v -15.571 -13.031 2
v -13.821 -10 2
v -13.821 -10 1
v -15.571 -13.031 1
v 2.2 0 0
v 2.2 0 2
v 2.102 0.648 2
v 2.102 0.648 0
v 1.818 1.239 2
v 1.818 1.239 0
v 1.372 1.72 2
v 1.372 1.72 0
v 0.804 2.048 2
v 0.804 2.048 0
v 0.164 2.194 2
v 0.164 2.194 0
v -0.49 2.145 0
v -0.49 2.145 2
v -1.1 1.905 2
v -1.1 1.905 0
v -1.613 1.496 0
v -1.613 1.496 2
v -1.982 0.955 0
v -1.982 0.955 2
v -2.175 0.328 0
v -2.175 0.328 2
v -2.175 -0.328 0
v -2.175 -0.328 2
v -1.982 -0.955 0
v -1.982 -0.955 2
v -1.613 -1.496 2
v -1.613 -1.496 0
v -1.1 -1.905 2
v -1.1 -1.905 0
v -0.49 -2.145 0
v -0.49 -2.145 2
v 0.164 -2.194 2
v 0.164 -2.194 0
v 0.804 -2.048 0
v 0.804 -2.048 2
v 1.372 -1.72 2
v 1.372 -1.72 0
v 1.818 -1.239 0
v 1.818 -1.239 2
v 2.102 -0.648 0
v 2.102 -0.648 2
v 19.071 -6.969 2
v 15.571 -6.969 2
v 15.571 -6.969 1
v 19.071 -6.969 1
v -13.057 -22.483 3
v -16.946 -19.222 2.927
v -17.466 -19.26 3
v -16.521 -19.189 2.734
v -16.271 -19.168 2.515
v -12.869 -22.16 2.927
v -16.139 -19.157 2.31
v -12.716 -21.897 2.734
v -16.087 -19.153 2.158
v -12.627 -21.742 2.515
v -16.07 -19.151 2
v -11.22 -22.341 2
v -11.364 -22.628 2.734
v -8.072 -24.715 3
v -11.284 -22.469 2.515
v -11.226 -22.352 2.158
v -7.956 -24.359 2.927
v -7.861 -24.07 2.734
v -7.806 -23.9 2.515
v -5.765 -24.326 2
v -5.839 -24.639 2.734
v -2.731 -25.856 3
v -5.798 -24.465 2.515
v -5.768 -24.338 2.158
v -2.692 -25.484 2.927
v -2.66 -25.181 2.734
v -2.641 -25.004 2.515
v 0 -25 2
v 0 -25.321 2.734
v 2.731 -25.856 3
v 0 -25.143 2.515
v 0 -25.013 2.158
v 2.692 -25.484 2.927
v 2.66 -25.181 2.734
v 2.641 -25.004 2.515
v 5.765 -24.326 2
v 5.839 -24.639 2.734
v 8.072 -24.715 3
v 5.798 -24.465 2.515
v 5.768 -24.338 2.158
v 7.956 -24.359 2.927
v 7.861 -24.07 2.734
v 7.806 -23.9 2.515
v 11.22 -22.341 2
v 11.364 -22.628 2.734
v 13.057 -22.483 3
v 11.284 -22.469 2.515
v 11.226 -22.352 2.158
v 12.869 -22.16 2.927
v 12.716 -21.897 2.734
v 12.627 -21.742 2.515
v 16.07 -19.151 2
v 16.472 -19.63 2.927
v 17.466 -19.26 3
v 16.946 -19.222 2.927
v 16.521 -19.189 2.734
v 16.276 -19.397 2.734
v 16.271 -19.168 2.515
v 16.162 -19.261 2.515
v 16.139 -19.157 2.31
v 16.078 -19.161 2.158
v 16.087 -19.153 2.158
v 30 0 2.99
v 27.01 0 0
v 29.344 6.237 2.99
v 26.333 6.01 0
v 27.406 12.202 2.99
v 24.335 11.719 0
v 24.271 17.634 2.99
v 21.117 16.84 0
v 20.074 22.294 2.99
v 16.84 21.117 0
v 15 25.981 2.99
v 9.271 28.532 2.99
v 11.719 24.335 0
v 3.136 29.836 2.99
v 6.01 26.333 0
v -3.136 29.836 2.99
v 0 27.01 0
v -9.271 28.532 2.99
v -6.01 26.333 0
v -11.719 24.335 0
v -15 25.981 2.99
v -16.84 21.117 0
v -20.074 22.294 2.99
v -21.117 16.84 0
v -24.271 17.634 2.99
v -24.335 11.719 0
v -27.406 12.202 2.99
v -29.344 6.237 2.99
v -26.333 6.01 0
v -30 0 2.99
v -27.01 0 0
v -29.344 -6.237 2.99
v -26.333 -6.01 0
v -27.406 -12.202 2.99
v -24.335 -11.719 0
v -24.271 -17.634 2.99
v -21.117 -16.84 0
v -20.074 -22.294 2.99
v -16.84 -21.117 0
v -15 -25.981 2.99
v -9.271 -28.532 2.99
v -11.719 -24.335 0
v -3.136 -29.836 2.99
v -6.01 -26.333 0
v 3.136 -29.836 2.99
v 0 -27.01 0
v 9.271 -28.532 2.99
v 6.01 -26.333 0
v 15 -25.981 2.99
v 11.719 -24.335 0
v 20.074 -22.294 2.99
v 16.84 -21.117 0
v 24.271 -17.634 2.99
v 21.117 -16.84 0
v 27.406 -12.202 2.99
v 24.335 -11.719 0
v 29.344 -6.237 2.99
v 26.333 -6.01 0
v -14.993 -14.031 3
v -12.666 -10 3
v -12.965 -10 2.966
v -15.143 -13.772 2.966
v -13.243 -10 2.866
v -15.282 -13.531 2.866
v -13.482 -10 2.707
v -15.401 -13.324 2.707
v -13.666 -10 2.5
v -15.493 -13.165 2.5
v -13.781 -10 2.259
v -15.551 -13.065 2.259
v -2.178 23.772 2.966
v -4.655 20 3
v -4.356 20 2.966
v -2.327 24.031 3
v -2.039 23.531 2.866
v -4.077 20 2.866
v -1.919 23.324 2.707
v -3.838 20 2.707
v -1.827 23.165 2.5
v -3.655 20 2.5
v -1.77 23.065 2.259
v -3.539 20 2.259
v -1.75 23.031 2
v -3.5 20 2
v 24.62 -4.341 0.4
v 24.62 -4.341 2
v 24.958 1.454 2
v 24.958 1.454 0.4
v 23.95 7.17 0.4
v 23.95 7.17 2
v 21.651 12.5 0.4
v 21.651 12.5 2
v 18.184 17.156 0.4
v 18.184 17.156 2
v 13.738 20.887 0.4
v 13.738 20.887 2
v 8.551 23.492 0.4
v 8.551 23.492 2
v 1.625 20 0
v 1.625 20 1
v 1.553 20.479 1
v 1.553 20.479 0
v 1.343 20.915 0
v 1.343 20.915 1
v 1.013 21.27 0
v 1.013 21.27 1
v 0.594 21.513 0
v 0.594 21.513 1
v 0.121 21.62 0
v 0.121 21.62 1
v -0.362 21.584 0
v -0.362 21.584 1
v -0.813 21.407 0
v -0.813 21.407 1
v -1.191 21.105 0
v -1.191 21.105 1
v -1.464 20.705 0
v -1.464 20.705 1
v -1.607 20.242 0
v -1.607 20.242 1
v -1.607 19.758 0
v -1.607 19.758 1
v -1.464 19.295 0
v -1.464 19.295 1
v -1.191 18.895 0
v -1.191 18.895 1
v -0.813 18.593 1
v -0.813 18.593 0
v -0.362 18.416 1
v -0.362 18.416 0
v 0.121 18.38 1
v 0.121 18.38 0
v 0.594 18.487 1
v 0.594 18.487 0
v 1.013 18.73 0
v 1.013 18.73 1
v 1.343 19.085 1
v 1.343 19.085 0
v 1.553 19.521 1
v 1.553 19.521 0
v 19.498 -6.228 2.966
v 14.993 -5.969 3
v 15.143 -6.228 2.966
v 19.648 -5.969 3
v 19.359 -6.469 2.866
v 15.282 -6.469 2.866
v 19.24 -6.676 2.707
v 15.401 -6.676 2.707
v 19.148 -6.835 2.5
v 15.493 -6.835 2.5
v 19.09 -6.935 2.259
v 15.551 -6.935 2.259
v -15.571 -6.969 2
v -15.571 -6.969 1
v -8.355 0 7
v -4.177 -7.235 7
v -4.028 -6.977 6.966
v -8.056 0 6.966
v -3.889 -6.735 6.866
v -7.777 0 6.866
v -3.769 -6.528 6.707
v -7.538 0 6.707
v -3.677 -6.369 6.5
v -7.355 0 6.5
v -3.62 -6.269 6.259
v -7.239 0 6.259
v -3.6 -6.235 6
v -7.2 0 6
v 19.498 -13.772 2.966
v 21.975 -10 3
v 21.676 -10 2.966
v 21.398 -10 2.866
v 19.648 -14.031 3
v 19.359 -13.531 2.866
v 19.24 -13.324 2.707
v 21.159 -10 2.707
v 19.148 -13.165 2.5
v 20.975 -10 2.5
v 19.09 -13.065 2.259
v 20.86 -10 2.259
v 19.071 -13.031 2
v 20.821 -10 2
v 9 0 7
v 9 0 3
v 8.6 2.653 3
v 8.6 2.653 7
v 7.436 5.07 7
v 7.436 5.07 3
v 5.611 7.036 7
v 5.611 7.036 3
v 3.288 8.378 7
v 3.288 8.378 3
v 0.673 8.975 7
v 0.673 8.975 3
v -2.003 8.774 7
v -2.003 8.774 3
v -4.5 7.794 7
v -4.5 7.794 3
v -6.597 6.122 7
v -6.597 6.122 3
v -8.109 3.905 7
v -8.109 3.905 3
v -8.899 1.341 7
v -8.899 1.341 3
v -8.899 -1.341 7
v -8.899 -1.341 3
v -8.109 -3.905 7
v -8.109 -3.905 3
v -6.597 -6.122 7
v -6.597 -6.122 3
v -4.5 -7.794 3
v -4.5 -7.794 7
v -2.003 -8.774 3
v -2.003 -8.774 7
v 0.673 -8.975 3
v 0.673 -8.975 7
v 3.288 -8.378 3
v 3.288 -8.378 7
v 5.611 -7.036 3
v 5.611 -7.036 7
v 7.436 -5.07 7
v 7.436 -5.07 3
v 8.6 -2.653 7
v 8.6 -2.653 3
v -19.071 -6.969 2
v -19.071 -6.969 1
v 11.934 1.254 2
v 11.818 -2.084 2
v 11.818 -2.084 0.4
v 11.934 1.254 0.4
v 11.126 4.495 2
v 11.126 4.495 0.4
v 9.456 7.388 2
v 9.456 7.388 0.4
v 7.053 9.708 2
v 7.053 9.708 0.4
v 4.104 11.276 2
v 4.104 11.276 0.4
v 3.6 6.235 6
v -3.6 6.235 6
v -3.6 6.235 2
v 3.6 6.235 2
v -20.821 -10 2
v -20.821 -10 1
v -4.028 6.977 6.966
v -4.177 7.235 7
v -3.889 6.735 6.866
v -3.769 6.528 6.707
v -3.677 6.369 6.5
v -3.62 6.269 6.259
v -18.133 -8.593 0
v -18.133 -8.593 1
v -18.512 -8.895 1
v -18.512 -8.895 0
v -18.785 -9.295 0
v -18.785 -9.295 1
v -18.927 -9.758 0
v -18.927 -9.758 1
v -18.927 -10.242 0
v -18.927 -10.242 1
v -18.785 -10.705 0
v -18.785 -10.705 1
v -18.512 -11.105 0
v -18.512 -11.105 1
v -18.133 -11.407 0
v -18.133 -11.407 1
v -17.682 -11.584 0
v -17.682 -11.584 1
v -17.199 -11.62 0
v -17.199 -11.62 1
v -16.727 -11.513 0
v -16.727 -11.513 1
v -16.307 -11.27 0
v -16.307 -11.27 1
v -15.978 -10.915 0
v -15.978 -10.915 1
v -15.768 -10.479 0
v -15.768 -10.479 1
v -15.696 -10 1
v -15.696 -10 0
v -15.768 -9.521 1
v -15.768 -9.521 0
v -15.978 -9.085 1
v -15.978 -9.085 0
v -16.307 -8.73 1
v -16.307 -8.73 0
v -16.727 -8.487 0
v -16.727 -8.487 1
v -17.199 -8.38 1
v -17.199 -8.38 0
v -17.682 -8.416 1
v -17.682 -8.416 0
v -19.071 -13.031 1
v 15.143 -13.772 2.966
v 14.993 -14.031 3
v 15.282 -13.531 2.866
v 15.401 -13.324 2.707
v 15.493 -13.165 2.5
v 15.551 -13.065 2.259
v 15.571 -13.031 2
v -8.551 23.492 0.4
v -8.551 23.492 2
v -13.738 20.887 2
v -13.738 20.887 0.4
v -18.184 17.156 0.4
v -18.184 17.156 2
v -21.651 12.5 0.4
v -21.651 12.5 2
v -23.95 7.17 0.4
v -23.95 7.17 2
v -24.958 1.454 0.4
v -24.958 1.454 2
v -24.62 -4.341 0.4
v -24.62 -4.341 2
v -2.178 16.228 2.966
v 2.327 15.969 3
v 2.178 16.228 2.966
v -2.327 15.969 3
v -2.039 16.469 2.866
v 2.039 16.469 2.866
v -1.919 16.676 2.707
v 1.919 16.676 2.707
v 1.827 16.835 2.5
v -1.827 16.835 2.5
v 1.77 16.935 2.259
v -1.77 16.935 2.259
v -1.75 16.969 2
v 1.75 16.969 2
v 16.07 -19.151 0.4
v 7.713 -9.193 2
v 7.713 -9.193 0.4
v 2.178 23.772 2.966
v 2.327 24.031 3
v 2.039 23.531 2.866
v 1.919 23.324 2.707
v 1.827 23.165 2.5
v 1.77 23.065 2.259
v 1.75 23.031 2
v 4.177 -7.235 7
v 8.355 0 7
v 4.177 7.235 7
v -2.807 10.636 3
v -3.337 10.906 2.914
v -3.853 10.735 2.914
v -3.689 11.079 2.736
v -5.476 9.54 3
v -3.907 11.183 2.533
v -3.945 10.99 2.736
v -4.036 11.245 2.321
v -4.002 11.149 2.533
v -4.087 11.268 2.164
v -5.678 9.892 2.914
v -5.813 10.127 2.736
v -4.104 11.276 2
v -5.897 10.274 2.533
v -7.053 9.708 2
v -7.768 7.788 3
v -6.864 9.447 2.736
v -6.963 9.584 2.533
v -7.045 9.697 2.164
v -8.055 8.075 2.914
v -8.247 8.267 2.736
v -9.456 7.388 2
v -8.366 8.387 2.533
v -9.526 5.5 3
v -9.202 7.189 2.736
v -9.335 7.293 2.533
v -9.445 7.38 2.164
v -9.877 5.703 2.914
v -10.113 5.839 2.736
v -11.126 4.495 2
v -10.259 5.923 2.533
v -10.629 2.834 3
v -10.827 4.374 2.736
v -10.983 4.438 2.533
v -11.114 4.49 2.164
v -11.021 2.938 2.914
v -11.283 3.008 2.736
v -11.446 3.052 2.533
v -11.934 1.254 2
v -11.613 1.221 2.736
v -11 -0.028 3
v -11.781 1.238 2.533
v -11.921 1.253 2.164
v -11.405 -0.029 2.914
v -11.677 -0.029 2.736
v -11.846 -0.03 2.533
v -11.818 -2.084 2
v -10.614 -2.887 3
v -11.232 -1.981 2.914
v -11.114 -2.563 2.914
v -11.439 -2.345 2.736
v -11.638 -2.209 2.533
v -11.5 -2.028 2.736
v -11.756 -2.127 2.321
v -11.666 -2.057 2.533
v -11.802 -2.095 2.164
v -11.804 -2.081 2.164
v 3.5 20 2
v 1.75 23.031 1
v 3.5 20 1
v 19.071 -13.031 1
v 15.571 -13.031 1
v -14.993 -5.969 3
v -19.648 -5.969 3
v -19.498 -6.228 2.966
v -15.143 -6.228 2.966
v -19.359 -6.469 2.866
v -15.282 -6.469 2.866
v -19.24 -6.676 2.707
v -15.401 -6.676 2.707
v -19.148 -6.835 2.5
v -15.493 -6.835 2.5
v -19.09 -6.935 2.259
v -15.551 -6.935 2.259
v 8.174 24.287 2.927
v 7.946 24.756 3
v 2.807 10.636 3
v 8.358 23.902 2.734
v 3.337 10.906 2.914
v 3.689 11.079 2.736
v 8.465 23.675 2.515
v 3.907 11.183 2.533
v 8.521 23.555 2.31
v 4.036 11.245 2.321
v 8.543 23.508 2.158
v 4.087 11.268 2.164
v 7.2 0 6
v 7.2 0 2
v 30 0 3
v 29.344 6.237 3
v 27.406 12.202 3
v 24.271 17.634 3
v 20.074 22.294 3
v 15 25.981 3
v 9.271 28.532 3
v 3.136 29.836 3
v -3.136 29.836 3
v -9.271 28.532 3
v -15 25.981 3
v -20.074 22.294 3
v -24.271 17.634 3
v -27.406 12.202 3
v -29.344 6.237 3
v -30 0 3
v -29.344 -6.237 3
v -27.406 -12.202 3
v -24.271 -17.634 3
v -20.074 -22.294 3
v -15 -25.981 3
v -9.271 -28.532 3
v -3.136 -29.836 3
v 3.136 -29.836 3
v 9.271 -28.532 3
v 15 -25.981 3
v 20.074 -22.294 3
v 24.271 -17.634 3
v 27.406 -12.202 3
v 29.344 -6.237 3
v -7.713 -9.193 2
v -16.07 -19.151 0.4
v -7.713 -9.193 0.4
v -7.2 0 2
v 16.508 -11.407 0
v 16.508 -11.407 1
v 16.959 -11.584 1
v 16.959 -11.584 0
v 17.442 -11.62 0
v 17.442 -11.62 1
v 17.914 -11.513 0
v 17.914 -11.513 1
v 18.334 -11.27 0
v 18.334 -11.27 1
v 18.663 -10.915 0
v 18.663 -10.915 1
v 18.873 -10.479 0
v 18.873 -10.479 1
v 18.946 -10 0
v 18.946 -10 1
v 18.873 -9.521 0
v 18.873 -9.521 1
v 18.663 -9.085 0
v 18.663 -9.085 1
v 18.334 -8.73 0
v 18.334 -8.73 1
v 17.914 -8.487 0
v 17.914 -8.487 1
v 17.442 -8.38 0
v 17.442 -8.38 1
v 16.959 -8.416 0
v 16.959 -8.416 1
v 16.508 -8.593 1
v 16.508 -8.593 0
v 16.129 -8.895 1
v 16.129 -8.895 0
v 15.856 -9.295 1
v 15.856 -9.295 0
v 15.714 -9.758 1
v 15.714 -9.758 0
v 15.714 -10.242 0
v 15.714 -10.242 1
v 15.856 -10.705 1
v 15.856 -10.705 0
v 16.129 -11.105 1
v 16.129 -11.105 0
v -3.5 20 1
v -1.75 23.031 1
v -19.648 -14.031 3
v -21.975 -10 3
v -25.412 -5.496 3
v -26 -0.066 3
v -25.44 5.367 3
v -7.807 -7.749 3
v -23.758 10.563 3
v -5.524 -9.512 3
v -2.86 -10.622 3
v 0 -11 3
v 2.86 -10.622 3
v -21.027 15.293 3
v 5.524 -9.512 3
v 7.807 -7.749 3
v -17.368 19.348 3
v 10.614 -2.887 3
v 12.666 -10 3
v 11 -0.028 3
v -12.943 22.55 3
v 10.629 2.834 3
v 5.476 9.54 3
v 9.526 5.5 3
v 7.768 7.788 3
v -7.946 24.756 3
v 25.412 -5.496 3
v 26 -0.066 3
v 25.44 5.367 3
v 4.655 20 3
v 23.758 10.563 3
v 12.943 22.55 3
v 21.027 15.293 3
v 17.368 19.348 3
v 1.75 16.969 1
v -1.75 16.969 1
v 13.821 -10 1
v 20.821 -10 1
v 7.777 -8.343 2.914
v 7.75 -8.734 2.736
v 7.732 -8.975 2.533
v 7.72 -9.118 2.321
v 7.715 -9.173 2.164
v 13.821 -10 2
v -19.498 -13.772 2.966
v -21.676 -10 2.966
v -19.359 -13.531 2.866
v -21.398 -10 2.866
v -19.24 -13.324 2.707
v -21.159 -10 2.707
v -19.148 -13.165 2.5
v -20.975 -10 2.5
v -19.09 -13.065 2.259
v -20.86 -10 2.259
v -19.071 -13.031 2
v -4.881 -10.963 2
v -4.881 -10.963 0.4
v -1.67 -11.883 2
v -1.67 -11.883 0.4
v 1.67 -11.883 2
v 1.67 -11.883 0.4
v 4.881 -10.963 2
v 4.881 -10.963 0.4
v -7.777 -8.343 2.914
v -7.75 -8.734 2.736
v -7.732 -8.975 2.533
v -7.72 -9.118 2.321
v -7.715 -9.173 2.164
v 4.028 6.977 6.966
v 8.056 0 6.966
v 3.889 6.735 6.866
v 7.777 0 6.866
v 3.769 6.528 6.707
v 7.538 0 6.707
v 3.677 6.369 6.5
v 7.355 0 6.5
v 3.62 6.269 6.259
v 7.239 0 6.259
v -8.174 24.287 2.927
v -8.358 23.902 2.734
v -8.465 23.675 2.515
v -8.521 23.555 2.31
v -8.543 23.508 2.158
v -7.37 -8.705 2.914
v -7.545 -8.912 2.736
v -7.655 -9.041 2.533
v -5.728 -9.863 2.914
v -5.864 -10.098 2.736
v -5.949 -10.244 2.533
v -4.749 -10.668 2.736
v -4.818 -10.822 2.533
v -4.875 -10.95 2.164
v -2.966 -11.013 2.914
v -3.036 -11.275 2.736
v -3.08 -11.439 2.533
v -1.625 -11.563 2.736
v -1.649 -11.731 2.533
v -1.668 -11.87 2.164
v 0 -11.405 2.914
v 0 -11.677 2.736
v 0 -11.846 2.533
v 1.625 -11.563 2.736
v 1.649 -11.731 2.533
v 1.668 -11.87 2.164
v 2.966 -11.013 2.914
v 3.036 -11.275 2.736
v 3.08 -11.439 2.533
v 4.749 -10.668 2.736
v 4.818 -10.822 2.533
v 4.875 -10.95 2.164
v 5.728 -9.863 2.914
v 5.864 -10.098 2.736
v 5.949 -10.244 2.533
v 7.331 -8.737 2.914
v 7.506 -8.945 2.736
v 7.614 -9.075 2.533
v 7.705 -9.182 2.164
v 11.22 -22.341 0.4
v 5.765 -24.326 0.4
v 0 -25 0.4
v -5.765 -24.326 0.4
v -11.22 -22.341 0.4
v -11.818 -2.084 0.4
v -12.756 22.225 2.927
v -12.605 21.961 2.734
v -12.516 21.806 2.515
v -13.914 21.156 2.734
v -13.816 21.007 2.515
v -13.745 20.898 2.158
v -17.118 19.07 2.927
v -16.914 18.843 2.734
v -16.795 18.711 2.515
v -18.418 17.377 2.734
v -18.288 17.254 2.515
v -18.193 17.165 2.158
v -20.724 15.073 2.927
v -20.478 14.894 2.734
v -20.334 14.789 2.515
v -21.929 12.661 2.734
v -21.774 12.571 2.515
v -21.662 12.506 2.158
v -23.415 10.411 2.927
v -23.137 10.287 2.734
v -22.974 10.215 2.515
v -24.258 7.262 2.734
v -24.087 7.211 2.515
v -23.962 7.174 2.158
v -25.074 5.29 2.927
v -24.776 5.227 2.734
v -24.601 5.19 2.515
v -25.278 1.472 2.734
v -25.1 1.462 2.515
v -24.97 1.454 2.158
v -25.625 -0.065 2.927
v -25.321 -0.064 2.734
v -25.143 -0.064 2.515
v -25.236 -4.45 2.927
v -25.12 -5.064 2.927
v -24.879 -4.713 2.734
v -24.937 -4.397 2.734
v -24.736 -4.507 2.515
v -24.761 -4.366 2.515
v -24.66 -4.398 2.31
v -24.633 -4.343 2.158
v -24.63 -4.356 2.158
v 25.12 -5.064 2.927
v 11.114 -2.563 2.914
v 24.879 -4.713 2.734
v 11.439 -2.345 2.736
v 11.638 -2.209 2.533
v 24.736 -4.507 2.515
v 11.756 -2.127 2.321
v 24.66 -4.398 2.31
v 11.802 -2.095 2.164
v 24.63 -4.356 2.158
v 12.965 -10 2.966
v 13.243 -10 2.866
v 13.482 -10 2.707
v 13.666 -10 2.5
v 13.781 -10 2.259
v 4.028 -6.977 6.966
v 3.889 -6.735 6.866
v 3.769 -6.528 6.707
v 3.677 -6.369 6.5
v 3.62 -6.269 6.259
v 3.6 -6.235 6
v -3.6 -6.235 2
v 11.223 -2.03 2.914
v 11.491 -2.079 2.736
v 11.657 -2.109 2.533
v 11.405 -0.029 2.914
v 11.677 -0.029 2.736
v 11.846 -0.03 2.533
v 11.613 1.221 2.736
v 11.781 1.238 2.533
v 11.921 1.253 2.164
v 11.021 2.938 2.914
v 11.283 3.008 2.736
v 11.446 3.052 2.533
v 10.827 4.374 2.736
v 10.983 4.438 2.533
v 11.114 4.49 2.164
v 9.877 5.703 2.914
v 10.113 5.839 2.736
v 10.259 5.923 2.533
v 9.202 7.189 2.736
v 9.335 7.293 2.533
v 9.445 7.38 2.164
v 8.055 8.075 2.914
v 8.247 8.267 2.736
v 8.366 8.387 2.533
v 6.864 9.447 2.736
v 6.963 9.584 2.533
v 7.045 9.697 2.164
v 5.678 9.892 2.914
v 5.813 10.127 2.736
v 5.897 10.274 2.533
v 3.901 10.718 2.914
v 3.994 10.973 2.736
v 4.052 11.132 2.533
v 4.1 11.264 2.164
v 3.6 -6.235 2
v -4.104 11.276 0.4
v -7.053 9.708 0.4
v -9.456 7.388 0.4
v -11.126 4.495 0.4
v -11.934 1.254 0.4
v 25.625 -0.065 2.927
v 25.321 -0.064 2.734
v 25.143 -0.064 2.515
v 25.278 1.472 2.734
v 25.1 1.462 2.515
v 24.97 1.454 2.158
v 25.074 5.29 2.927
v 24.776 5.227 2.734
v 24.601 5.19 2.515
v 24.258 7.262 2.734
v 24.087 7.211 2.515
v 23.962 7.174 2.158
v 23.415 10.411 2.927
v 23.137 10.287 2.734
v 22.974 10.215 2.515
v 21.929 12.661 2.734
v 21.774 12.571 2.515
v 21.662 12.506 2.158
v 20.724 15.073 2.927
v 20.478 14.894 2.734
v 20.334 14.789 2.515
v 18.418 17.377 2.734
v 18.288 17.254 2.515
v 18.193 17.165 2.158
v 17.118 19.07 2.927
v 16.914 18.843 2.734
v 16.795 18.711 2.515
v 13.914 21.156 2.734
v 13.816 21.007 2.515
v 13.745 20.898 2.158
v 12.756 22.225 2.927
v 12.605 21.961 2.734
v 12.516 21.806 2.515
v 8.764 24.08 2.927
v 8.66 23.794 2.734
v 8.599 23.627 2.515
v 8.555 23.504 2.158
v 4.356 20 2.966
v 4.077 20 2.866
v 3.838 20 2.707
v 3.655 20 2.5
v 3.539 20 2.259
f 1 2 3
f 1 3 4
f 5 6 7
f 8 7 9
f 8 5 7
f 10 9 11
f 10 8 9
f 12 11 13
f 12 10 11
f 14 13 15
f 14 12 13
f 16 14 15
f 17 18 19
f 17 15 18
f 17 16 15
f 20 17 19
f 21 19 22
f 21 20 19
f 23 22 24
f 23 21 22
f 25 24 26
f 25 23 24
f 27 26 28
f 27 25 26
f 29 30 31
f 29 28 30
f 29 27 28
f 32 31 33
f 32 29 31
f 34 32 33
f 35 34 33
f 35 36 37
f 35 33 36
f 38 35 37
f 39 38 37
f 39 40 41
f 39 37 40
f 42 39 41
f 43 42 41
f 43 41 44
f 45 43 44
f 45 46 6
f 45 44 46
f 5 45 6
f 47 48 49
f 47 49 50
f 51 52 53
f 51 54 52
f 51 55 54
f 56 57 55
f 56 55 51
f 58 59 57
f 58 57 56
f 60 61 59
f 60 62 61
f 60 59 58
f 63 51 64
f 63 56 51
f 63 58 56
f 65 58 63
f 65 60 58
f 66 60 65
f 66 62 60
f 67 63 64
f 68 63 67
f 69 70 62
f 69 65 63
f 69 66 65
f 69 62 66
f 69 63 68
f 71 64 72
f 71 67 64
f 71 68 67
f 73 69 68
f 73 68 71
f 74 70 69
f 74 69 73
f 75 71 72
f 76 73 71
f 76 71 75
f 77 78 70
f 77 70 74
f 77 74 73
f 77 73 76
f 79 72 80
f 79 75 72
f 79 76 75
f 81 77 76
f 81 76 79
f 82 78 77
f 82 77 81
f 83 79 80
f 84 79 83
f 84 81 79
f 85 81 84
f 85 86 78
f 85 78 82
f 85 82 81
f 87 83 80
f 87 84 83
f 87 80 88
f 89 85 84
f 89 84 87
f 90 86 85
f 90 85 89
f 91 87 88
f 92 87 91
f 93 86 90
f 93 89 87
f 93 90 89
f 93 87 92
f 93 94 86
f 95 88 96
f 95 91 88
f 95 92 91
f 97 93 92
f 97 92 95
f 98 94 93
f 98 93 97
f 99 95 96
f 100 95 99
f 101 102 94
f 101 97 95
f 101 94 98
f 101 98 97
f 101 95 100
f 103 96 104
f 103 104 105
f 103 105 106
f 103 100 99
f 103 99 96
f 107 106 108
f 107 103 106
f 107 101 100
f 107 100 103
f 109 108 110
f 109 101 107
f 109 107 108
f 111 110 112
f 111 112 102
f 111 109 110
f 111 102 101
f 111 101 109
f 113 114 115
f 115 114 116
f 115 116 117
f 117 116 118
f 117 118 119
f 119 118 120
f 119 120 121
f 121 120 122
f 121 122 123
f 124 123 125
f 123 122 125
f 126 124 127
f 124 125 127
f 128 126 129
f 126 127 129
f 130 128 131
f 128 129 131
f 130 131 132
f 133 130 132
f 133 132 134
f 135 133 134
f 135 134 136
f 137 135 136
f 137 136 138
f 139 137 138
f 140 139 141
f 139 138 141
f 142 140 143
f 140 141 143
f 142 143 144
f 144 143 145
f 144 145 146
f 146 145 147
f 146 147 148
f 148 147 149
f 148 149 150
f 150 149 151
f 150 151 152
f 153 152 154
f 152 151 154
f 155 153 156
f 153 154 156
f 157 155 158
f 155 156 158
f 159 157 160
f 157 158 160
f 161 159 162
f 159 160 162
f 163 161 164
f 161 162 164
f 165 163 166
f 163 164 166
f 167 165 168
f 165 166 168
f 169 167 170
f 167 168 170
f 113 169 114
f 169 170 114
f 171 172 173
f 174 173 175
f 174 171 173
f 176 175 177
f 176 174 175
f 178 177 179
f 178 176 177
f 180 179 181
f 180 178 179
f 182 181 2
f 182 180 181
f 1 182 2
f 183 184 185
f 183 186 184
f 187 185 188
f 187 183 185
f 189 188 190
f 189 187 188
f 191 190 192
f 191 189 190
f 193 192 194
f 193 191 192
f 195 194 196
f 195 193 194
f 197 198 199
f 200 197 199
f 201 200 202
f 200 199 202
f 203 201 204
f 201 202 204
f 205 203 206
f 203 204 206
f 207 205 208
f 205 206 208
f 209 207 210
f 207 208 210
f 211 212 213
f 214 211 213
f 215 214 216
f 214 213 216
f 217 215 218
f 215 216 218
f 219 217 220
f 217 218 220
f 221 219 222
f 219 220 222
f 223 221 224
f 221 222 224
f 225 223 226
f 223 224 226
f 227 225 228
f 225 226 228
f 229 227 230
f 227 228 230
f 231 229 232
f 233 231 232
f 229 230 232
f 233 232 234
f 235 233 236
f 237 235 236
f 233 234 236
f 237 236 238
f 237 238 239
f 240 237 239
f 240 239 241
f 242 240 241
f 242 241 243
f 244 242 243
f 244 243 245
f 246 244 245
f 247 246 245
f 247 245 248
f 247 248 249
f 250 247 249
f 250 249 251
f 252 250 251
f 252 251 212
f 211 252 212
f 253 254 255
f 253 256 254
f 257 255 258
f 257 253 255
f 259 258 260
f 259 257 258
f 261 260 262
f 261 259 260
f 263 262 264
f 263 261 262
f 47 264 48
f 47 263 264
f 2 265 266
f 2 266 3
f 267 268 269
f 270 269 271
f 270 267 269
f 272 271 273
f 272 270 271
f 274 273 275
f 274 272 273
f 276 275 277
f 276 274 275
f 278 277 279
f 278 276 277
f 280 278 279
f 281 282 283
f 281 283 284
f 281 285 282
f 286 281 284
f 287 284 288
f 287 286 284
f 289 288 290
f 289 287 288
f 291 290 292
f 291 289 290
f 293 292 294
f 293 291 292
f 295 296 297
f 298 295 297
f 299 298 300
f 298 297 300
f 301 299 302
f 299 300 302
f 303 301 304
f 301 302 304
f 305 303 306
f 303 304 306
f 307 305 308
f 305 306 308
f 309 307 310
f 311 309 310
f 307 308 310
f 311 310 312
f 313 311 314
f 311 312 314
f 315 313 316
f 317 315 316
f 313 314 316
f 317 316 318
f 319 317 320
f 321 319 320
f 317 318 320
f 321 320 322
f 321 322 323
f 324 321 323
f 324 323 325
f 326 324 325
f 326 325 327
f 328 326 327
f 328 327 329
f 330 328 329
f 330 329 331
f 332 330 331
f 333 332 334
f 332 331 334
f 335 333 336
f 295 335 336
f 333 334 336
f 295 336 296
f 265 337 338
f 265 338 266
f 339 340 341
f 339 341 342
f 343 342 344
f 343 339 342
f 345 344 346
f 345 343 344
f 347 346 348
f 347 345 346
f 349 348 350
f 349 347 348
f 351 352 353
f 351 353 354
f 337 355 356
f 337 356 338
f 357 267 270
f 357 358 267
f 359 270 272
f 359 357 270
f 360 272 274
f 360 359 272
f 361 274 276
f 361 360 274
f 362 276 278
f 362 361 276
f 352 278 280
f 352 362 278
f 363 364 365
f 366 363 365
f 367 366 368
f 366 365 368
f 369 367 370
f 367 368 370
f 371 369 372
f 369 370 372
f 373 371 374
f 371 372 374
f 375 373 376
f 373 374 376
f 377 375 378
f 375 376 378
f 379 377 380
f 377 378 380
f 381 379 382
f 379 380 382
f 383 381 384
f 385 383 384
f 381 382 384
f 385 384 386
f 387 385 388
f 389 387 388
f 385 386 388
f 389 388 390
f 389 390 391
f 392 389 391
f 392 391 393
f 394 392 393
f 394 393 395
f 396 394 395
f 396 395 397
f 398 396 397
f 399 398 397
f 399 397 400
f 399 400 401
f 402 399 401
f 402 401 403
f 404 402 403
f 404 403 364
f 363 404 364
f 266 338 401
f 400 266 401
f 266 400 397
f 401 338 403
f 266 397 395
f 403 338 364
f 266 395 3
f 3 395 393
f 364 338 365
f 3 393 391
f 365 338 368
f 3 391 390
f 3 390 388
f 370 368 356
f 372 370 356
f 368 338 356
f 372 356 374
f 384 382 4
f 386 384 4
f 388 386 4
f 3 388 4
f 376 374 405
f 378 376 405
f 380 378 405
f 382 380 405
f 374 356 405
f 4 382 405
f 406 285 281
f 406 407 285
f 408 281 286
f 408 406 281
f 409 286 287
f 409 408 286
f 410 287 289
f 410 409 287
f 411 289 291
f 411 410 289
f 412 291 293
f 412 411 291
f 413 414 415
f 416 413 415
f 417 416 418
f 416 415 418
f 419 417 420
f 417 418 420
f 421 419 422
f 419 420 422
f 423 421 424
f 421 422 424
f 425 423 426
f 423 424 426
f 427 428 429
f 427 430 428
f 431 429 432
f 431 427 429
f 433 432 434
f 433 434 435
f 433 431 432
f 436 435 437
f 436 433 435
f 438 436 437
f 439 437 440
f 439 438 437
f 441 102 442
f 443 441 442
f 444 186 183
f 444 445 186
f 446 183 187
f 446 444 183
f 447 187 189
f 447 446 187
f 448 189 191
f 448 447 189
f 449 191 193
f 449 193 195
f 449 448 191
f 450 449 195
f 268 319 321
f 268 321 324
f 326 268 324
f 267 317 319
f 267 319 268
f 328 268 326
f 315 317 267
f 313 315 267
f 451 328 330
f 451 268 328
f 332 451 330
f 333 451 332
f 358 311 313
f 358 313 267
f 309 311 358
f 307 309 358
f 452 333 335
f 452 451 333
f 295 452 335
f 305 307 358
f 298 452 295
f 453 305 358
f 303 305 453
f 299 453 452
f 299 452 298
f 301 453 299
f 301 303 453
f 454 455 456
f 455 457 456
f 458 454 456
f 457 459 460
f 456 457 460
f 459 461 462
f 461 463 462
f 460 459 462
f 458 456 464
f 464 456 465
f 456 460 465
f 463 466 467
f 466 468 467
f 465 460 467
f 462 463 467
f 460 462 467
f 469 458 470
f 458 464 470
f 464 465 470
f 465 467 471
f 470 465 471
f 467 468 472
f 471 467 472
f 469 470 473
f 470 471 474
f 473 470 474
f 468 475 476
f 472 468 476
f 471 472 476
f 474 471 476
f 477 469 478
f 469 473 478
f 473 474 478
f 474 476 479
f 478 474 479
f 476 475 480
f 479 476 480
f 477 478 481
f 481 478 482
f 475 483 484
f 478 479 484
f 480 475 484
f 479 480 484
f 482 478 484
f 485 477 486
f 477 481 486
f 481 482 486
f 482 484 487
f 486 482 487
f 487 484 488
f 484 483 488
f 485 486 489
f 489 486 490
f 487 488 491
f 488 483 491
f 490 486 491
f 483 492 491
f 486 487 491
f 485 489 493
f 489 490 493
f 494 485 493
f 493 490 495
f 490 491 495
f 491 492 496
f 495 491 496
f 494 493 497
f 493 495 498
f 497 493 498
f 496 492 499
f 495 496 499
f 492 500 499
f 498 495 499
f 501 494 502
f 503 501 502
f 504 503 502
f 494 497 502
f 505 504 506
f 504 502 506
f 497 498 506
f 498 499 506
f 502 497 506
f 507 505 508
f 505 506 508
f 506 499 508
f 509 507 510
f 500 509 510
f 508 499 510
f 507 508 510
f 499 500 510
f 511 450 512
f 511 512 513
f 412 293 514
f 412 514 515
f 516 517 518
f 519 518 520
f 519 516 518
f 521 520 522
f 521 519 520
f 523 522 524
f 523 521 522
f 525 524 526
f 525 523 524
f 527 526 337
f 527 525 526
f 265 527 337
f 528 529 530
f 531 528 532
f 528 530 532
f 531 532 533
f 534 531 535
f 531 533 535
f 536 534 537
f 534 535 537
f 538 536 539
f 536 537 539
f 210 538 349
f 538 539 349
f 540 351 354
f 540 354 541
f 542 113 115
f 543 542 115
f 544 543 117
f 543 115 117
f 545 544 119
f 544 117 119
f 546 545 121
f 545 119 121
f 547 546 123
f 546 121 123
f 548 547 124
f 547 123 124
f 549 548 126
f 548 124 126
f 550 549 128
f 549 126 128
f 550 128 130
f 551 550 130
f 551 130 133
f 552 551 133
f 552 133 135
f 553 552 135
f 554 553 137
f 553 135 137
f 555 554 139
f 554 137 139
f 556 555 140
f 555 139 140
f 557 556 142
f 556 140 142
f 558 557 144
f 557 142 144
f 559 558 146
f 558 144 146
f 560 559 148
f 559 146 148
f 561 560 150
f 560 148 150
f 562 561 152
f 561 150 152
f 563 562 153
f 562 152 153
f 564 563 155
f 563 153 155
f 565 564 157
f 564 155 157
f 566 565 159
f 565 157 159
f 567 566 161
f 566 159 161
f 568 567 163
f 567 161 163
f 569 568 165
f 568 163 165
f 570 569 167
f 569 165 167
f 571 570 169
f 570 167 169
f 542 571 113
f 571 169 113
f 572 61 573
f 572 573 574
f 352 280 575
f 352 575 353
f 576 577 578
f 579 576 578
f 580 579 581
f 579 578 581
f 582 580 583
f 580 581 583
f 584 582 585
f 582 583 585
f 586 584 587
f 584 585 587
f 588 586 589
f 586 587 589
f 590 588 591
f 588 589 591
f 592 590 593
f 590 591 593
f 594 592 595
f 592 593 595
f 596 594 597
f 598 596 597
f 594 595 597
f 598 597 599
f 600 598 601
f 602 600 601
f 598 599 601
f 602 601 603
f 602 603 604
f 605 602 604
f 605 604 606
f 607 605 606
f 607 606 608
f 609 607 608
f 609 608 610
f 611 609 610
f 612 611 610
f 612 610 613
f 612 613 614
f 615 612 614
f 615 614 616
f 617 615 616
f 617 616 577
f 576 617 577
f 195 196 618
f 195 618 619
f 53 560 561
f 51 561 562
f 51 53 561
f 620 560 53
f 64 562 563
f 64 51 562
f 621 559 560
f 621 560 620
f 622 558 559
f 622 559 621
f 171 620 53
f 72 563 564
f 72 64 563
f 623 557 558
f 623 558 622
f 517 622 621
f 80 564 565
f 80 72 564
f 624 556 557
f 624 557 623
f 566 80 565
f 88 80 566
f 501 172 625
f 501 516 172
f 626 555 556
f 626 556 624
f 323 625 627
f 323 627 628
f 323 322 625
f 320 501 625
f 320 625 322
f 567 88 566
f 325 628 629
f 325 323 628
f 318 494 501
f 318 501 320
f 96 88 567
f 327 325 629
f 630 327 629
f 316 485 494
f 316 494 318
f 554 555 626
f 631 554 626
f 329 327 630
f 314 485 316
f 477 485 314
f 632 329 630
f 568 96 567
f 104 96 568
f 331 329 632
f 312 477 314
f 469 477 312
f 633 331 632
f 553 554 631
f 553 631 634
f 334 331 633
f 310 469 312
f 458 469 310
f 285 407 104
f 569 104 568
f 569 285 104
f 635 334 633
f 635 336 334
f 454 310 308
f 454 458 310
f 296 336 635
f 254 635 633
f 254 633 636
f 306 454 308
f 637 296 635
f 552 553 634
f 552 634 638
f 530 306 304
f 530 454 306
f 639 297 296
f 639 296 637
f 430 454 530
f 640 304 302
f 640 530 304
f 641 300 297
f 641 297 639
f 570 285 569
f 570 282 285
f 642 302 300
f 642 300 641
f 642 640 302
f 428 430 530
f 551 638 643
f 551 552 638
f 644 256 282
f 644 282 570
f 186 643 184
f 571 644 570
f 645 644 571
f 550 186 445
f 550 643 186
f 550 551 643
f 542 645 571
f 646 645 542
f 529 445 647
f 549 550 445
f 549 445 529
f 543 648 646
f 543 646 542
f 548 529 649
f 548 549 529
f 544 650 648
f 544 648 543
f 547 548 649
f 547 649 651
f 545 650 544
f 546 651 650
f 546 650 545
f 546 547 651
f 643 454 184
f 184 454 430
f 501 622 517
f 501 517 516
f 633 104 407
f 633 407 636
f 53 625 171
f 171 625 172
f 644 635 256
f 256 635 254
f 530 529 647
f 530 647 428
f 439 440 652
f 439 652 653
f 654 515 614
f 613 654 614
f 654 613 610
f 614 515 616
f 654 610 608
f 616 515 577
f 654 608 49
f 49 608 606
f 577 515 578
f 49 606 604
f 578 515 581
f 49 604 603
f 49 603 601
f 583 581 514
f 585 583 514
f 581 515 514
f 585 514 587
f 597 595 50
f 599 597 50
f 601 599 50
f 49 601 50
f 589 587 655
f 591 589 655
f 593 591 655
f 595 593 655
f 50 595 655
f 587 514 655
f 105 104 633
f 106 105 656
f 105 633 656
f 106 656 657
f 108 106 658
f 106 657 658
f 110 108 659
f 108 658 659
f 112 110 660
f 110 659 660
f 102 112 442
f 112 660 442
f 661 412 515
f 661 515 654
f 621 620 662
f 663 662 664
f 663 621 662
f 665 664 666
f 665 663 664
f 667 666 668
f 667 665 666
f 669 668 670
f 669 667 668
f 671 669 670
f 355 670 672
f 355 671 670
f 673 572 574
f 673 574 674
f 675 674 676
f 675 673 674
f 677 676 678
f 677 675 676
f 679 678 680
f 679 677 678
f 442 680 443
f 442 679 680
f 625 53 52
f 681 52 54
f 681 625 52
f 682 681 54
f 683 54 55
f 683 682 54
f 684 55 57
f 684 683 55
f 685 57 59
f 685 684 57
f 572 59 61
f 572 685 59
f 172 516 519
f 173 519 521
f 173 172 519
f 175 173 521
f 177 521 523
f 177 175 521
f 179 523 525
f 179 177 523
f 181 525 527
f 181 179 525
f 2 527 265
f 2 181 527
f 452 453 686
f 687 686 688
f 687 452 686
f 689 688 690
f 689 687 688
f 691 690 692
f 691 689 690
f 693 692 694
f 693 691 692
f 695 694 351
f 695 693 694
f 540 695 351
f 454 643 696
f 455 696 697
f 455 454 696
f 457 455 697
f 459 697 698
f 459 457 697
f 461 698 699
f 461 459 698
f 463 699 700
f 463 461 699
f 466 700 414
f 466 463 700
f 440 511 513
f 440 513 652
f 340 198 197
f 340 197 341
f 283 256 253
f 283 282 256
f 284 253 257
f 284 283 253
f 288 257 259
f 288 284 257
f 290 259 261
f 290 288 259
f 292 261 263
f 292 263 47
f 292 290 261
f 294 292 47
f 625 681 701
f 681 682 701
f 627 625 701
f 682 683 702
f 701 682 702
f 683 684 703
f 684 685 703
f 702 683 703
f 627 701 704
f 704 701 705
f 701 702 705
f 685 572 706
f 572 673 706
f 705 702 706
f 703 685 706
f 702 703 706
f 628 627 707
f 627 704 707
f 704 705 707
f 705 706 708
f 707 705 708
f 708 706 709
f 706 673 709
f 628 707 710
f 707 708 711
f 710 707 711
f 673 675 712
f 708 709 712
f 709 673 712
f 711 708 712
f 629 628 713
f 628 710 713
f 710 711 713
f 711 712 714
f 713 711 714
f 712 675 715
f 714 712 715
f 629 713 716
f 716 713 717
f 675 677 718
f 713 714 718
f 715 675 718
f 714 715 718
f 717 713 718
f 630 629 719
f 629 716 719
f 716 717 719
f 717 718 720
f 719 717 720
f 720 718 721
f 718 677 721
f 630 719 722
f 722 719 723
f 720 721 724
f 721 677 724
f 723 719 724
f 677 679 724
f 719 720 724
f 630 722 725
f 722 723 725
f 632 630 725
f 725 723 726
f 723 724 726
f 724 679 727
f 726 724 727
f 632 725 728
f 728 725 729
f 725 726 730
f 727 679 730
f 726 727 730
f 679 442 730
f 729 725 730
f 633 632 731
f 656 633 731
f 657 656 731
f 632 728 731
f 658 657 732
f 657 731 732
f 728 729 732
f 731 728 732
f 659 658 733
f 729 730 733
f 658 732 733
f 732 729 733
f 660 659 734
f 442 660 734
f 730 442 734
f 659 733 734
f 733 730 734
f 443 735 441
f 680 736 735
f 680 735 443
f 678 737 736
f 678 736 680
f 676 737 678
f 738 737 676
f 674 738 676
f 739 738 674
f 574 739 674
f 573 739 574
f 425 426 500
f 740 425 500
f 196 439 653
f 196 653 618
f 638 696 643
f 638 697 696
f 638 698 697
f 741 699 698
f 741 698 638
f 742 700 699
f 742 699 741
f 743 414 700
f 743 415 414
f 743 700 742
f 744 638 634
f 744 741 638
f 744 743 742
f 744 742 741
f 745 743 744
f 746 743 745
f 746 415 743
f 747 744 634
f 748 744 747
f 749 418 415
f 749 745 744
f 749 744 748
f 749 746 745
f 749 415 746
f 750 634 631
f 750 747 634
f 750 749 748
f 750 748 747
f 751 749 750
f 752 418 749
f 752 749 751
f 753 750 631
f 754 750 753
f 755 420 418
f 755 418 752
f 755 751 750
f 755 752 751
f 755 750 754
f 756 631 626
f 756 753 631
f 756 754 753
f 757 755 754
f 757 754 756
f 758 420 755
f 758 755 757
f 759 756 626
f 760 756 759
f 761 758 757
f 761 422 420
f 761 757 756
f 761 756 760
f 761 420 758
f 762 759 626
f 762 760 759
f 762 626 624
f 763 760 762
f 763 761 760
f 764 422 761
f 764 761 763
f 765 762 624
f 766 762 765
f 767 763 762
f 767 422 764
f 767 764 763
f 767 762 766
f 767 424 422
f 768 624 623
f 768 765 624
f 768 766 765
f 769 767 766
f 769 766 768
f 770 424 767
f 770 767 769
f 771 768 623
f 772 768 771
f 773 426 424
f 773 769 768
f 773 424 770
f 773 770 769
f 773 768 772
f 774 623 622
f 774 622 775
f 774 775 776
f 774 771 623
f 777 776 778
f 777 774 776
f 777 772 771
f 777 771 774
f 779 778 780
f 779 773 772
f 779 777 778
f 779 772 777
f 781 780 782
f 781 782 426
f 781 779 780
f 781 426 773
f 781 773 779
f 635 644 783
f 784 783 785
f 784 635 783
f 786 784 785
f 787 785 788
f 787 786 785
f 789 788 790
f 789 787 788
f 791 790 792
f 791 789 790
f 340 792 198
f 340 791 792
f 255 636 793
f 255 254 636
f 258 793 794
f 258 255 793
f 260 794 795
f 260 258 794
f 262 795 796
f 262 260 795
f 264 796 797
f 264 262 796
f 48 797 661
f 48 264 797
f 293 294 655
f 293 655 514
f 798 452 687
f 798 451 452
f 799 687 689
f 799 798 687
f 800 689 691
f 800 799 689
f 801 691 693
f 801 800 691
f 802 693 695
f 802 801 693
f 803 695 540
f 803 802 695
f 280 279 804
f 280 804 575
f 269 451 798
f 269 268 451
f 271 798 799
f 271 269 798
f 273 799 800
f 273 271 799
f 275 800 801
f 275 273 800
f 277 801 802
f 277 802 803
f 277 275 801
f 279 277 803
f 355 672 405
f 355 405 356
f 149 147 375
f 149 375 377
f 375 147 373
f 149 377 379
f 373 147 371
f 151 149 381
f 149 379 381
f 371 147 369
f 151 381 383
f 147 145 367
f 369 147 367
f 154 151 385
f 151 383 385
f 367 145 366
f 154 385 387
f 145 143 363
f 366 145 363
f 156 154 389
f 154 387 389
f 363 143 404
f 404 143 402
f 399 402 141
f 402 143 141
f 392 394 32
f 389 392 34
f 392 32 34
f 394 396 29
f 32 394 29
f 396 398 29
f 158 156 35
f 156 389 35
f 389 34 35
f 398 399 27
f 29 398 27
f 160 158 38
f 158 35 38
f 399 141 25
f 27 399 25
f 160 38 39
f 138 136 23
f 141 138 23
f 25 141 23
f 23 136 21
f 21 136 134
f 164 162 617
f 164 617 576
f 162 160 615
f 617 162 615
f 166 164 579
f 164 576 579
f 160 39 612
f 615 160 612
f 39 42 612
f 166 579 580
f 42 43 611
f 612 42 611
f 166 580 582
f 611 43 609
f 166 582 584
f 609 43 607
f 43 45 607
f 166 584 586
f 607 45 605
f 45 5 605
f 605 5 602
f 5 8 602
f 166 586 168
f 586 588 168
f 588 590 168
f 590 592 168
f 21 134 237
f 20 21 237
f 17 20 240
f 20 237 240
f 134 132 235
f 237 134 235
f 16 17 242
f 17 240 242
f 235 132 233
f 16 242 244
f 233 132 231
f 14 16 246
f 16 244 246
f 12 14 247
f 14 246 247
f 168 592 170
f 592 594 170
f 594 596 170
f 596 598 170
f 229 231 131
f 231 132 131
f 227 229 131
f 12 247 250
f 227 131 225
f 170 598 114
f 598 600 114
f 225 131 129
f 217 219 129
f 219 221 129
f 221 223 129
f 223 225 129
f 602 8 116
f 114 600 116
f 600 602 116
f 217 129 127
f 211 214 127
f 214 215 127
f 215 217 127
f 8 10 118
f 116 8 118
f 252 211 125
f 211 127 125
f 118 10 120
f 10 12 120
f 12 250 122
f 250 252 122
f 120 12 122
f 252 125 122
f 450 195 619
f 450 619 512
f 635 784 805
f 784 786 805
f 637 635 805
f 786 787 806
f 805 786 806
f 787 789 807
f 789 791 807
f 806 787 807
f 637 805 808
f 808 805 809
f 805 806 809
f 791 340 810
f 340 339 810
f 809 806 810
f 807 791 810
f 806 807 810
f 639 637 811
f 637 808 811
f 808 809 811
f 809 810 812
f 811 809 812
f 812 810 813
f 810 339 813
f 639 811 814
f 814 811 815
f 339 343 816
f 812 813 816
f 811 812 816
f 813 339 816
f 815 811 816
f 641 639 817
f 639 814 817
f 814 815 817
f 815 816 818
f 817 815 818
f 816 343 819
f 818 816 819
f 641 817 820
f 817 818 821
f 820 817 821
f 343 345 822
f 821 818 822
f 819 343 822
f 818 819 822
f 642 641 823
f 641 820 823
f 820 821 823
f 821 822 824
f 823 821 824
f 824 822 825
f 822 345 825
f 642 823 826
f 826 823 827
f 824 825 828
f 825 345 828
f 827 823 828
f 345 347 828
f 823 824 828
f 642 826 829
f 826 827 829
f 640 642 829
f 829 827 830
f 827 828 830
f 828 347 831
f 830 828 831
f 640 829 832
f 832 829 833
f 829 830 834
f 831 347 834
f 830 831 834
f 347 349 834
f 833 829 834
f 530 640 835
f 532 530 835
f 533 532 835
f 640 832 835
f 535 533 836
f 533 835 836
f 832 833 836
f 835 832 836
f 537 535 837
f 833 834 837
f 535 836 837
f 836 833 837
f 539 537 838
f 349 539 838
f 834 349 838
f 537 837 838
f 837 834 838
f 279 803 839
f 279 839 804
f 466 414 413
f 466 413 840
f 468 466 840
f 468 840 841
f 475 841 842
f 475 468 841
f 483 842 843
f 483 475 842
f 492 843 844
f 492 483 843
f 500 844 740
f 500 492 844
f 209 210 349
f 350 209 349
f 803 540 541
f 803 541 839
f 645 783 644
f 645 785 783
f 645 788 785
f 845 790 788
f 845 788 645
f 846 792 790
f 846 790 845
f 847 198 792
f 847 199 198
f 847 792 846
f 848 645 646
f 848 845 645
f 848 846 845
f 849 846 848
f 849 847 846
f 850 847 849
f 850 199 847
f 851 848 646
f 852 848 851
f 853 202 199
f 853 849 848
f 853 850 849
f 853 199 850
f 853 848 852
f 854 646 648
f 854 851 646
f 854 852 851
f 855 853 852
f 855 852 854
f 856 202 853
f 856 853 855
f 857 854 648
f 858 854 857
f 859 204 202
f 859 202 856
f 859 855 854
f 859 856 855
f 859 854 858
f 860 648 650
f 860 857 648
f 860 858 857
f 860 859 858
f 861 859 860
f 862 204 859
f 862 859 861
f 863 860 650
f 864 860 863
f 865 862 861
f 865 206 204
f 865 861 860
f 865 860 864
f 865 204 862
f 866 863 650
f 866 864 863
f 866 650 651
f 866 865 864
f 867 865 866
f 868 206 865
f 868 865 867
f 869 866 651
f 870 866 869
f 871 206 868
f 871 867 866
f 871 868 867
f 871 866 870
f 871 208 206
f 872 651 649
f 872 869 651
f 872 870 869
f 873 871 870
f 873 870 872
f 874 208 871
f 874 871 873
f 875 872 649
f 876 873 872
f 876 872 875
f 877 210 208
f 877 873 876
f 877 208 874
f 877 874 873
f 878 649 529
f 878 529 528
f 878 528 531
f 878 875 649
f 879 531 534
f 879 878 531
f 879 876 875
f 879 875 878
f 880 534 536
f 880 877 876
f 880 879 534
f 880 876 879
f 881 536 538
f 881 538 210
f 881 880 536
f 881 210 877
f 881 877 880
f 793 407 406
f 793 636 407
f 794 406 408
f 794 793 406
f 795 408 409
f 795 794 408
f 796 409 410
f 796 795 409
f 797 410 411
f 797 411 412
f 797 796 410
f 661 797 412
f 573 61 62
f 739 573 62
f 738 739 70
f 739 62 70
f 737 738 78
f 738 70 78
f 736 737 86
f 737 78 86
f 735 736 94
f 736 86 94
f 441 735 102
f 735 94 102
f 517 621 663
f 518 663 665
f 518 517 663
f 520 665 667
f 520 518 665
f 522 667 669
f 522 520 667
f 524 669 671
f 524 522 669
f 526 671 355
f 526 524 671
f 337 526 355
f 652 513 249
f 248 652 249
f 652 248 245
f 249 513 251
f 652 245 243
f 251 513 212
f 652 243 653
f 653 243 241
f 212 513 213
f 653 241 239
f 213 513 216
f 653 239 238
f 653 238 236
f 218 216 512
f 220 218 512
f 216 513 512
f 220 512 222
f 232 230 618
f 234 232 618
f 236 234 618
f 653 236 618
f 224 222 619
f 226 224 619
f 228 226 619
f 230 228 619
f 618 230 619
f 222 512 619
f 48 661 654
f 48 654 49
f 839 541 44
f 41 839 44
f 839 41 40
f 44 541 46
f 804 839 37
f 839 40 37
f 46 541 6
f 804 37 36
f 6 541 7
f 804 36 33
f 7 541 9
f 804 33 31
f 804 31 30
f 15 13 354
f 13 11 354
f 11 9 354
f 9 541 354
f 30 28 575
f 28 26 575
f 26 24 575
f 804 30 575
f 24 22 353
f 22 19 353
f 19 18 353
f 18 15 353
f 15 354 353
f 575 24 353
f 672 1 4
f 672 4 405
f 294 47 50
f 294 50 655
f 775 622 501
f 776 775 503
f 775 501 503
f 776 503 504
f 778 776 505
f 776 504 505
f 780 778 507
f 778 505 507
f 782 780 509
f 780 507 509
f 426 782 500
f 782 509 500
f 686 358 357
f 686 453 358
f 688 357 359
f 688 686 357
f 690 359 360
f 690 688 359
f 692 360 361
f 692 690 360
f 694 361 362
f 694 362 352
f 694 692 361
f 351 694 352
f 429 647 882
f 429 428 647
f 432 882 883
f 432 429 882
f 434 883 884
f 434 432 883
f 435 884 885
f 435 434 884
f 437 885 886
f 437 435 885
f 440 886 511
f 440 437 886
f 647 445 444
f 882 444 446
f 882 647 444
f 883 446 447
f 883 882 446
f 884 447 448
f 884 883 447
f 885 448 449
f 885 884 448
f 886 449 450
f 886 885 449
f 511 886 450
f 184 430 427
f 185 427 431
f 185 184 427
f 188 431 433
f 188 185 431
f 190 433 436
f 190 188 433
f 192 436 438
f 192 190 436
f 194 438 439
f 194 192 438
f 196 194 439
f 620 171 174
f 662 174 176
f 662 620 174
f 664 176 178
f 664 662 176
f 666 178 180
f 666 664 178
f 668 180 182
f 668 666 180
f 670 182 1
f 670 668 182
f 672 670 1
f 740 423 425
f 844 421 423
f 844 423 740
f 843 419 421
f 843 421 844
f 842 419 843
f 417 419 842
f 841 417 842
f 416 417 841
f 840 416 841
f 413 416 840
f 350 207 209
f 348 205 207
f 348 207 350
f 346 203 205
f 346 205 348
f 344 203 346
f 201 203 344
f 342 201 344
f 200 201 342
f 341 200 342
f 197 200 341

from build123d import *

# Parameters (mm, degrees)
SKETCH004_R           = 30
SKETCH004_R_2         = 2.2
PAD001_DEPTH          = 3
POCKET004_DEPTH       = 2
POLARPATTERN002_COUNT = 3
POCKET002_DEPTH       = 2.6
POLARPATTERN004_COUNT = 3
SKETCH006_R           = 9
PAD_DEPTH             = 4
SKETCH007_R           = 1.625
POCKET_DEPTH          = 5
POLARPATTERN_COUNT    = 3
POCKET005_DEPTH       = 5
FILLET_R              = 1
CHAMFER_SIZE          = 2.99


with BuildPart() as part:
    # Sketch004 → Pad001 (new body)
    with BuildSketch(Plane.XY):
        Circle(SKETCH004_R)
        Circle(SKETCH004_R_2, mode=Mode.SUBTRACT)
    extrude(amount=PAD001_DEPTH)

    # Sketch005 (on Face4 of Pad001) → Pocket004 (cut)
    with BuildSketch(Plane.XY.offset(3)):
        Polygon((-1.75, 23.031089), (1.75, 23.031089), (3.5, 20), (1.75, 16.968911), (-1.75, 16.968911), (-3.5, 20), align=None)
    pocket004 = extrude(amount=-POCKET004_DEPTH, mode=Mode.SUBTRACT)

    # PolarPattern002: Pocket004 ×3 about axis
    polarpattern002_axis = Axis((0, 0, 3), (0, 0, 1))
    for i in range(1, POLARPATTERN002_COUNT):
        add(pocket004.rotate(polarpattern002_axis, i * 360 / POLARPATTERN002_COUNT), mode=Mode.SUBTRACT)

    # Sketch003 → Pocket002 (cut)
    with BuildSketch(Plane.XY.offset(3)):
        with BuildLine():
            ThreePointArc((-8.550504, 23.492316), (-21.650635, 12.5), (-24.620194, -4.341204))
            Line((-24.620194, -4.341204), (-11.817693, -2.083778))
            ThreePointArc((-4.104242, 11.276311), (-10.392305, 6), (-11.817693, -2.083778))
            Line((-8.550504, 23.492316), (-4.104242, 11.276311))
        make_face()
    pocket002 = extrude(amount=-POCKET002_DEPTH, mode=Mode.SUBTRACT)

    # PolarPattern004: Pocket002 ×3 about axis
    polarpattern004_axis = Axis((0, 0, 3), (0, 0, 1))
    for i in range(1, POLARPATTERN004_COUNT):
        add(pocket002.rotate(polarpattern004_axis, i * 360 / POLARPATTERN004_COUNT), mode=Mode.SUBTRACT)

    # Sketch006 → Pad (join)
    with BuildSketch(Plane.XY.offset(3)):
        Circle(SKETCH006_R)
    extrude(amount=PAD_DEPTH)

    # Sketch007 (on Face3 of PolarPattern002) → Pocket (cut)
    with BuildSketch(Plane.XY.offset(3)):
        with Locations((0, 20)):
            Circle(SKETCH007_R)
    pocket = extrude(amount=-POCKET_DEPTH, mode=Mode.SUBTRACT)

    # PolarPattern: Pocket ×3 about axis
    polarpattern_axis = Axis((0, 0, 3), (0, 0, 1))
    for i in range(1, POLARPATTERN_COUNT):
        add(pocket.rotate(polarpattern_axis, i * 360 / POLARPATTERN_COUNT), mode=Mode.SUBTRACT)

    # Sketch (on Face46 of PolarPattern) → Pocket005 (cut)
    with BuildSketch(Plane.XY.offset(7)):
        Polygon((-3.6, 6.235383), (3.6, 6.235383), (7.2, 0), (3.6, -6.235383), (-3.6, -6.235383), (-7.2, 0), align=None)
    extrude(amount=-POCKET005_DEPTH, mode=Mode.SUBTRACT)

    # Fillet
    fillet_edges = [part.edges().sort_by_distance(p)[0] for p in [
        (0, 23.031089, 3),
        (2.625, 21.515544, 3),
        (2.625, 18.484456, 3),
        (0, 16.968911, 3),
        (-2.625, 18.484456, 3),
        (-2.625, 21.515544, 3),
        (-6.327373, 17.384313, 3),
        (-21.650635, 12.5, 3),
        (-10.392305, 6, 3),
        (-18.218943, -3.212491, 3),
        (-17.320508, -6.968911, 3),
        (-19.945508, -8.484456, 3),
        (-14.695508, -8.484456, 3),
        (-14.695508, -11.515544, 3),
        (-17.320508, -13.031089, 3),
        (-19.945508, -11.515544, 3),
        (0, -12, 3),
        (-11.891571, -14.171822, 3),
        (11.891571, -14.171822, 3),
        (0, -25, 3),
        (17.320508, -6.968911, 3),
        (19.945508, -8.484456, 3),
        (19.945508, -11.515544, 3),
        (17.320508, -13.031089, 3),
        (14.695508, -11.515544, 3),
        (14.695508, -8.484456, 3),
        (18.218943, -3.212491, 3),
        (21.650635, 12.5, 3),
        (6.327373, 17.384313, 3),
        (10.392305, 6, 3),
        (0, 6.235383, 7),
        (5.4, 3.117691, 7),
        (5.4, -3.117691, 7),
        (0, -6.235383, 7),
        (-5.4, -3.117691, 7),
        (-5.4, 3.117691, 7),
    ]]
    fillet(fillet_edges, radius=FILLET_R)

    # Chamfer
    chamfer_edges = [part.edges().sort_by_distance(p)[0] for p in [
        (-30, 0, 0),
    ]]
    chamfer(chamfer_edges, length=CHAMFER_SIZE)


solid = part.part
